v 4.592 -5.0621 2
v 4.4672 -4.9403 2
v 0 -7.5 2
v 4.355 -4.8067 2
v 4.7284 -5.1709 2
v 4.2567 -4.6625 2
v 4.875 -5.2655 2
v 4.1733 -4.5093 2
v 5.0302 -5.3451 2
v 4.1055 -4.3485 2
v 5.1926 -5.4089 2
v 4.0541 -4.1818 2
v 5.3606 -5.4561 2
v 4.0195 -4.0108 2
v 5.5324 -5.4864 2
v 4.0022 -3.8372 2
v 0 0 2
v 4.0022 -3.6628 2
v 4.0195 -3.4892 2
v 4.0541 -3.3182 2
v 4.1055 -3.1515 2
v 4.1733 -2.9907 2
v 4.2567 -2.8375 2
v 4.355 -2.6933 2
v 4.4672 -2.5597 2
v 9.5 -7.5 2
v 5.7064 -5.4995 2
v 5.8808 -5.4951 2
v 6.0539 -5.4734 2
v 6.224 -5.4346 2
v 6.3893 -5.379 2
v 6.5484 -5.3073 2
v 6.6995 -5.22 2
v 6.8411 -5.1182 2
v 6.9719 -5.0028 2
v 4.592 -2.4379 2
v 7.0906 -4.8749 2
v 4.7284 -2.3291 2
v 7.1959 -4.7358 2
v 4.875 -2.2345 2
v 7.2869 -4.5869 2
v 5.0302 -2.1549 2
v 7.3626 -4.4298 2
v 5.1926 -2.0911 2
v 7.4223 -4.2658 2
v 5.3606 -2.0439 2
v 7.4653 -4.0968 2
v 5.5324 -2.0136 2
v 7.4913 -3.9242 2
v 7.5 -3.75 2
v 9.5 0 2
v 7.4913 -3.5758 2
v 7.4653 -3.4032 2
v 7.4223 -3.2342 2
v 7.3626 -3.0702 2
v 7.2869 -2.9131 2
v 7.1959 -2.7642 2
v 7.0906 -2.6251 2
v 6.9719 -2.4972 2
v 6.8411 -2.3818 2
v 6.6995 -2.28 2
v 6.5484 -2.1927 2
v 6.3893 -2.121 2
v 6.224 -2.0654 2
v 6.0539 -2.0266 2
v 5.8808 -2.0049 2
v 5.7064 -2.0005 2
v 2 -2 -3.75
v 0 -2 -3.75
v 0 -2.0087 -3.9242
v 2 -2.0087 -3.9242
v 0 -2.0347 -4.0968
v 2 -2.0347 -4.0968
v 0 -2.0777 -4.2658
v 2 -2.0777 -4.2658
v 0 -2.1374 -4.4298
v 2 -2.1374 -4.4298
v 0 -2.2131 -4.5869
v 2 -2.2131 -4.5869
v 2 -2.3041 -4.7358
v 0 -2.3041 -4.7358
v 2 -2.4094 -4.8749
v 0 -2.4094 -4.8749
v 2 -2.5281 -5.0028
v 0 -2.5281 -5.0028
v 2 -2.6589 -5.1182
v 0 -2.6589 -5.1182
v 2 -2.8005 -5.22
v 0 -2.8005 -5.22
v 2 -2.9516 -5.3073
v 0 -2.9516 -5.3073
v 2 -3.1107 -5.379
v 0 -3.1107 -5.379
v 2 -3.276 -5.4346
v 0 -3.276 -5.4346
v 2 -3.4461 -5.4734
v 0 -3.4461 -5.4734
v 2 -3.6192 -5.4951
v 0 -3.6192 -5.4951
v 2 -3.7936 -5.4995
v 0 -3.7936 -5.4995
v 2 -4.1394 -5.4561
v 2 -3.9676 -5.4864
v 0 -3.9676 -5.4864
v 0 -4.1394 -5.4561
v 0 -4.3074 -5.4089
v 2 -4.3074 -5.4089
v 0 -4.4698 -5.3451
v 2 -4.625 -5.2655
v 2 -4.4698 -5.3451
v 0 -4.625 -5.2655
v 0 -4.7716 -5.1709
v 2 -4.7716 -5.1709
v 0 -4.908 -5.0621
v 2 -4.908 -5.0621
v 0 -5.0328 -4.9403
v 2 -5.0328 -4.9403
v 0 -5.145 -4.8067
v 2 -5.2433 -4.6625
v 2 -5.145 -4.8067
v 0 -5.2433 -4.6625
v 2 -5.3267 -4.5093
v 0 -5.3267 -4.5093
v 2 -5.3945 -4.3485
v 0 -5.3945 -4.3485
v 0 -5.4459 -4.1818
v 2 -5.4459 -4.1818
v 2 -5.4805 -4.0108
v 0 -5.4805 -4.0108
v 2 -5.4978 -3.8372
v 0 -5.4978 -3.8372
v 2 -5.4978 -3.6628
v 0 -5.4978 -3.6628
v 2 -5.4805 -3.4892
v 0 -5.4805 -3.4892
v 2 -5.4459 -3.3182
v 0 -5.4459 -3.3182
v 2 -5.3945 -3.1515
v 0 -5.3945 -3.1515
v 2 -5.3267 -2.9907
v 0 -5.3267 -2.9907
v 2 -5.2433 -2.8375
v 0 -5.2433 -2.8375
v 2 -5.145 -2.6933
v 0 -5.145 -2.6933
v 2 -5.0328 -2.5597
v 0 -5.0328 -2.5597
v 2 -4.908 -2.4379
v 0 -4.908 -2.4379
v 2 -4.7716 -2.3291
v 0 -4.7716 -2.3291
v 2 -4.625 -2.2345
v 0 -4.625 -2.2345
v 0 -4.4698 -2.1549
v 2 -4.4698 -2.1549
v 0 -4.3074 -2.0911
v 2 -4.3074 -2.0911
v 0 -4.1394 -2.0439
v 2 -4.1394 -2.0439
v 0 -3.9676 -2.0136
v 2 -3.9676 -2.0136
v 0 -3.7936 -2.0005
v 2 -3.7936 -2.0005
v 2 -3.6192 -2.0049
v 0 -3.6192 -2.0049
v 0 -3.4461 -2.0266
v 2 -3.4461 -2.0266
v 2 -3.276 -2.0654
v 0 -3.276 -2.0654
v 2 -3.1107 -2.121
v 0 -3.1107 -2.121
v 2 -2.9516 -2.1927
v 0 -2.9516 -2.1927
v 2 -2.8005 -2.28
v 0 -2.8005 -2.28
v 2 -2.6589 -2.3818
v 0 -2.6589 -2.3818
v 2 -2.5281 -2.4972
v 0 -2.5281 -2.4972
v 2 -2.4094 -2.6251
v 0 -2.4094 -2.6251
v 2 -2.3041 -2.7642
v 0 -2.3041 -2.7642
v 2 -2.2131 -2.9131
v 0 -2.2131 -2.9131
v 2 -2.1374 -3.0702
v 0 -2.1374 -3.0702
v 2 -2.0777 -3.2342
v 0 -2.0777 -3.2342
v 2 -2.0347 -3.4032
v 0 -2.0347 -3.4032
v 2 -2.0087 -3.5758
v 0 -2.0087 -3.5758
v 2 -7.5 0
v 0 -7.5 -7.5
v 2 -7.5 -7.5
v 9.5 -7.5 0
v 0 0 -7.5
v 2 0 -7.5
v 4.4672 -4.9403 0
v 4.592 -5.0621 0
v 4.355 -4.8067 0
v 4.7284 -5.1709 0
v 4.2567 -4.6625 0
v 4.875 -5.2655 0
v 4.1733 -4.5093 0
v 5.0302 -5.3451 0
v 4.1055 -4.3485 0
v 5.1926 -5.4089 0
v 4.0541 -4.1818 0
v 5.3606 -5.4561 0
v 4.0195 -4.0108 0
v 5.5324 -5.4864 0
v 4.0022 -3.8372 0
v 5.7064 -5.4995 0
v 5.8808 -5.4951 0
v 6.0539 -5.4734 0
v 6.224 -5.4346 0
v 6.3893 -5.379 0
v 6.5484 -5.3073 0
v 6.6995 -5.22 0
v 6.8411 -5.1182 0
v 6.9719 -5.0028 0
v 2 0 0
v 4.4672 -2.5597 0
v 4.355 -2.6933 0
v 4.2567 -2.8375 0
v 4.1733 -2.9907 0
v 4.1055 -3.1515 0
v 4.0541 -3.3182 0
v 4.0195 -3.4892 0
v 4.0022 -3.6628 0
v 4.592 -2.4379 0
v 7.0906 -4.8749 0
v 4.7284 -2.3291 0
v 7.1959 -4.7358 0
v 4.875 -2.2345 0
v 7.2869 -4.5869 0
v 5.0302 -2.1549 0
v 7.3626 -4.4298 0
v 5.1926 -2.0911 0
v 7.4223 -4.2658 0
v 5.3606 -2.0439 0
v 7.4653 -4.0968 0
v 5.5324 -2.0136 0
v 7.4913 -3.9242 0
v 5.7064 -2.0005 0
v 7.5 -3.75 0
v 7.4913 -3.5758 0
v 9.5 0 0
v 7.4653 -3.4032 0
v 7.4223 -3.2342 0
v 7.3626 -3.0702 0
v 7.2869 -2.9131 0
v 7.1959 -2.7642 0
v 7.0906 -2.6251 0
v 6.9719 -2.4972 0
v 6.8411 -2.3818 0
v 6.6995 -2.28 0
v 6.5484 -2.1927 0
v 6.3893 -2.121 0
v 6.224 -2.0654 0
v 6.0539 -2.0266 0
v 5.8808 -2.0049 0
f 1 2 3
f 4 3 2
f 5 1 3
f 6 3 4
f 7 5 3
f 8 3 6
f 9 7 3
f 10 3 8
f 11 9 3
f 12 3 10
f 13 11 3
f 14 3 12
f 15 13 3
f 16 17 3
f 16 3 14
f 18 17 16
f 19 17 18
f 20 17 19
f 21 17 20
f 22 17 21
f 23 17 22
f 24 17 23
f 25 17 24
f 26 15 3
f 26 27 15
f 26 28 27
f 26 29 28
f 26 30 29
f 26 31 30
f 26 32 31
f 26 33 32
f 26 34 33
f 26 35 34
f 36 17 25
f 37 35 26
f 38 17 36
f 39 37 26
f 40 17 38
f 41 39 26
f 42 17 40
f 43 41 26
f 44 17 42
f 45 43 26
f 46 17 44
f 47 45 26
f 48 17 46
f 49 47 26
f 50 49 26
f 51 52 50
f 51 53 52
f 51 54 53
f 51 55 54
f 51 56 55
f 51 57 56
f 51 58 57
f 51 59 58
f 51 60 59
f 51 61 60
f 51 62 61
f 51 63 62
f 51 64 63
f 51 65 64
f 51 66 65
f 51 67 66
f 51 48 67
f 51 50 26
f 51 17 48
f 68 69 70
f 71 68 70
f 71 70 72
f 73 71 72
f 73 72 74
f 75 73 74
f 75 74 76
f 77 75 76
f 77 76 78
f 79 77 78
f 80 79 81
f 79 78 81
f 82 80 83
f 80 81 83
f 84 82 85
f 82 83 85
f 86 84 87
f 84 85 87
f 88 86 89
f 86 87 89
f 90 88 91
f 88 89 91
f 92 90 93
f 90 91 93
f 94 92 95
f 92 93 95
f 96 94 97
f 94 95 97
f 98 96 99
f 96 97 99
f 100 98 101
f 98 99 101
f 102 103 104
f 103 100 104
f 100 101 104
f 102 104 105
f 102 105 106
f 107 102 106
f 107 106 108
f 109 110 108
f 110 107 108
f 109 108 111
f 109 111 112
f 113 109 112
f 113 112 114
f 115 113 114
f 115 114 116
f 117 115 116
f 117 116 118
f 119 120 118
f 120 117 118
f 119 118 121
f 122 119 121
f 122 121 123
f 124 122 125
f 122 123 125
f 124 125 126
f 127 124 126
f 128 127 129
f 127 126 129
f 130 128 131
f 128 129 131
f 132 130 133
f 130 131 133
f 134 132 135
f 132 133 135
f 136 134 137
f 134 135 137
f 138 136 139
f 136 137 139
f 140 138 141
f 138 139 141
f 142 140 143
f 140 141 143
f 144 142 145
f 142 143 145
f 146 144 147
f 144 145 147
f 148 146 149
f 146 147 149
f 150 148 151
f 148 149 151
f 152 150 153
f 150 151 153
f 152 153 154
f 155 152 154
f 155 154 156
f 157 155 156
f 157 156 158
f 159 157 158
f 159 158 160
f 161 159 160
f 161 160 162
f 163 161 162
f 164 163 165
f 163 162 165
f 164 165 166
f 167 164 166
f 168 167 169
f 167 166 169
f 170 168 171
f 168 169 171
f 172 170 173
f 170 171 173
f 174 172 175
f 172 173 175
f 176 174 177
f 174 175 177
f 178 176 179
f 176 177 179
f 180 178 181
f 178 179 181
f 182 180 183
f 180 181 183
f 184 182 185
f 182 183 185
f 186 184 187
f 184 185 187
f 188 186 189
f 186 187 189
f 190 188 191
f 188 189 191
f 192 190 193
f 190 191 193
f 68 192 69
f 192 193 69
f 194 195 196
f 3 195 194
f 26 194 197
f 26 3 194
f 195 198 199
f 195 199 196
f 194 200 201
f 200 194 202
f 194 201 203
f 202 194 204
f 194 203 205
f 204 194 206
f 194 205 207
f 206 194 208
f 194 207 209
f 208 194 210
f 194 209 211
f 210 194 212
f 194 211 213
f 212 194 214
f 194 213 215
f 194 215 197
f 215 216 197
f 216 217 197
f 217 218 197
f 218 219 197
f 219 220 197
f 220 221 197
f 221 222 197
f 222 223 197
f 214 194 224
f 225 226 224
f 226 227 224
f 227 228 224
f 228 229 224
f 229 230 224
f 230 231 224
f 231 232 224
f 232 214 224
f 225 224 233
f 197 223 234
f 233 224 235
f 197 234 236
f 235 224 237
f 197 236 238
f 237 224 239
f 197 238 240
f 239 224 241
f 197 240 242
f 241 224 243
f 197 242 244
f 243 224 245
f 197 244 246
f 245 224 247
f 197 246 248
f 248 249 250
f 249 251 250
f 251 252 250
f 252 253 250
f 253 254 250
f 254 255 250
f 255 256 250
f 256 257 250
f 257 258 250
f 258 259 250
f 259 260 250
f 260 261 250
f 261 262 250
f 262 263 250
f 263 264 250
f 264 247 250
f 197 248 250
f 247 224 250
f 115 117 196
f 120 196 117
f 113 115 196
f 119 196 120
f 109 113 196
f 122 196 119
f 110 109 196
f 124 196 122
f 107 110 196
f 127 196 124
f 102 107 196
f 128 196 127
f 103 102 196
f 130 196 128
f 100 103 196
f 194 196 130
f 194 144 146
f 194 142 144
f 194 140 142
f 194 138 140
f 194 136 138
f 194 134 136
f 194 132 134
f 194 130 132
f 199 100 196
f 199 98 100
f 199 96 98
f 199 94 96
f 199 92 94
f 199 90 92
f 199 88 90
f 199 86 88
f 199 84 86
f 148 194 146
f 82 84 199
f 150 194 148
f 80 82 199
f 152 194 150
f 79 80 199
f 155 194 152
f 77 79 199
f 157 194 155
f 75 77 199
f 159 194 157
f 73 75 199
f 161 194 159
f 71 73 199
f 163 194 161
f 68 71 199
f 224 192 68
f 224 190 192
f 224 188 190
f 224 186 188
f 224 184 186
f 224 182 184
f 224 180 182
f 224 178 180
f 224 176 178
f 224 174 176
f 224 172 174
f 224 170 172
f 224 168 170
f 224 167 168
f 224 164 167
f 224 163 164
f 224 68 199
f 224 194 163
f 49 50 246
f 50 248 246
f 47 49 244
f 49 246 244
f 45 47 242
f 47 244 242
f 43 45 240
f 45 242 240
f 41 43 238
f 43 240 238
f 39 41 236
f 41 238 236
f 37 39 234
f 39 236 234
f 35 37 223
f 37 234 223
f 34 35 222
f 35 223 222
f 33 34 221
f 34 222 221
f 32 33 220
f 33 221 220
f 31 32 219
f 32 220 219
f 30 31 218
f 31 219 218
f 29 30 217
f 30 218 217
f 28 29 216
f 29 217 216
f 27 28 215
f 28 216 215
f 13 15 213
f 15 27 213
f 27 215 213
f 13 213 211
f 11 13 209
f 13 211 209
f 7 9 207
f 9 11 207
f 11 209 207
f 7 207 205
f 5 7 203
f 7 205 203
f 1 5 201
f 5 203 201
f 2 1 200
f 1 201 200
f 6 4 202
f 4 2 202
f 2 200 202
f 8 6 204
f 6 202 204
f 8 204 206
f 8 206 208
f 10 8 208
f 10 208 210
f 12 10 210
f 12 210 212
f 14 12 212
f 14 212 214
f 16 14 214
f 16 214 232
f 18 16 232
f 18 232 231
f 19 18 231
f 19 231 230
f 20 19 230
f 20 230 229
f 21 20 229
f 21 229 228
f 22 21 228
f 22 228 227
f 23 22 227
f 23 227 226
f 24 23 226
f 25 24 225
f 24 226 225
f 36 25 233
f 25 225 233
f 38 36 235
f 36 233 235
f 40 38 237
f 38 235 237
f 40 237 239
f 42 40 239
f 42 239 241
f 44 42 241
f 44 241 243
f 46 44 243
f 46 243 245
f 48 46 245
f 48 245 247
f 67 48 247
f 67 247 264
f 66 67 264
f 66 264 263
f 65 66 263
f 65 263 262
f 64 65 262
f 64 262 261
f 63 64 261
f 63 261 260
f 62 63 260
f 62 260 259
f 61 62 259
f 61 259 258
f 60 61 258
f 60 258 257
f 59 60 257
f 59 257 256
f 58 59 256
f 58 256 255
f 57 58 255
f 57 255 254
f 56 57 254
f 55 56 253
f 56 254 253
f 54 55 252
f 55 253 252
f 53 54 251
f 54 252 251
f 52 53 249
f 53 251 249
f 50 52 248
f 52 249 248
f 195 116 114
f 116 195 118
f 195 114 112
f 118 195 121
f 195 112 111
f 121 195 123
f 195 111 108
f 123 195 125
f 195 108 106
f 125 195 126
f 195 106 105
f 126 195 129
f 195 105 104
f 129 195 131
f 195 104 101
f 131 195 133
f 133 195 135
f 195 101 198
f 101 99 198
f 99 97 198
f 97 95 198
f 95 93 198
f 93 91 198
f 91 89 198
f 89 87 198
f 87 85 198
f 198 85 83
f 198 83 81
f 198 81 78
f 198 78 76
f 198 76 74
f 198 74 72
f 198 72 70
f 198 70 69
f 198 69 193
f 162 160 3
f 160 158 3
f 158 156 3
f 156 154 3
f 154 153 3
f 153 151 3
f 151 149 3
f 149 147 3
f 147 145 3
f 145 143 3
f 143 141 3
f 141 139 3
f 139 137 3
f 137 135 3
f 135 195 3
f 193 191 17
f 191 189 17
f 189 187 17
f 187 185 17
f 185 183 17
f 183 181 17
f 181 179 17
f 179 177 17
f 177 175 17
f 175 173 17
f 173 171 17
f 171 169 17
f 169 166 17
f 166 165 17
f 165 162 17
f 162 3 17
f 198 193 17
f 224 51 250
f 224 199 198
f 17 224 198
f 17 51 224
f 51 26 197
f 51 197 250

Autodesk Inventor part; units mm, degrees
ref_plane "YZ Plane" through (0, 0, 0) normal (1, 0, 0) x (0, 1, 0)
ref_plane "XZ Plane" through (0, 0, 0) normal (0, 1, 0) x (-1, 0, 0)
ref_plane "XY Plane" through (0, 0, 0) normal (0, 0, 1) x (1, 0, 0)
sketch "Boceto1" plane through (0, 0, 0) normal (1, 0, 0) x (0, 1, 0)
  line L0 (0, 0) -> (0, -2)
  line L1 (0, -2) -> (0, -5.5)
  line L2 (0, -5.5) -> (0, -7.5)
  line L3 (0, -7.5) -> (-2, -7.5)
  line L4 (-2, -7.5) -> (-5.5, -7.5)
  line L5 (0, 0) -> (-5.5, 0)
  line L6 (-5.5, -7.5) -> (-7.5, -7.5)
  line L7 (-7.5, -7.5) -> (-7.5, 0)
  line L8 (-7.5, 0) -> (0, 0)
  circle A0 centre (-3.75, -3.75) radius 1.75
  dimension "d0" = 2
  dimension "d1" = 3.5
  dimension "d2" = 2
  dimension "d3" = 2
  dimension "d4" = 3.5
  dimension "d5" = 2
sketch "Boceto2" plane through (0, 0, 0) normal (0, 0, 1) x (1, 0, 0)
  line L0 (0, 0) -> (2, 0)
  line L1 (2, 0) -> (2, -7.5)
  line L2 (2, 0) -> (3, 0)
  line L3 (2.8119, -7.5) -> (0, -7.5)
  line L4 (0, -7.5) -> (0, 0)
  line L5 (3, 0) -> (3, -7.5)
  line L6 (3, -7.5) -> (0, -7.5)
  line L7 (3, 0) -> (6.5, 0)
  line L8 (6.5, 0) -> (8.5, 0)
  line L9 (8.5, 0) -> (8.5, -7.5)
  line L10 (8.5, -7.5) -> (3, -7.5)
  circle A0 centre (5.75, -3.75) radius 1.75
  dimension "d6" = 2
  dimension "d15" = 1
  dimension "d16" = 3.5
  dimension "d17" = 2
  dimension "d18" = 3.5
extrude "Extrusión1" add sketch "Boceto1" along normal blind 2
extrude "Extrusión2" add sketch "Boceto2" along normal blind 2
sketch "Boceto4" plane through (0, 0, 2) normal (0, 0, 1) x (1, 0, 0)
  line L0 (8.5, -7.5) -> (9.5, -7.5)
  line L1 (9.5, -7.5) -> (9.5, 0)
  line L2 (9.5, 0) -> (8.5, 0)
  line L3 (8.5, -7.5) -> (8.5, 0) projected
  line L4 (8.5, 0) -> (8.5, -7.5)
  point P0 (0, 0)
  dimension "d24" = 1
extrude "Extrusión3" add sketch "Boceto4" against normal blind 2
properties part number "Pantalla - tirado 90gr"
